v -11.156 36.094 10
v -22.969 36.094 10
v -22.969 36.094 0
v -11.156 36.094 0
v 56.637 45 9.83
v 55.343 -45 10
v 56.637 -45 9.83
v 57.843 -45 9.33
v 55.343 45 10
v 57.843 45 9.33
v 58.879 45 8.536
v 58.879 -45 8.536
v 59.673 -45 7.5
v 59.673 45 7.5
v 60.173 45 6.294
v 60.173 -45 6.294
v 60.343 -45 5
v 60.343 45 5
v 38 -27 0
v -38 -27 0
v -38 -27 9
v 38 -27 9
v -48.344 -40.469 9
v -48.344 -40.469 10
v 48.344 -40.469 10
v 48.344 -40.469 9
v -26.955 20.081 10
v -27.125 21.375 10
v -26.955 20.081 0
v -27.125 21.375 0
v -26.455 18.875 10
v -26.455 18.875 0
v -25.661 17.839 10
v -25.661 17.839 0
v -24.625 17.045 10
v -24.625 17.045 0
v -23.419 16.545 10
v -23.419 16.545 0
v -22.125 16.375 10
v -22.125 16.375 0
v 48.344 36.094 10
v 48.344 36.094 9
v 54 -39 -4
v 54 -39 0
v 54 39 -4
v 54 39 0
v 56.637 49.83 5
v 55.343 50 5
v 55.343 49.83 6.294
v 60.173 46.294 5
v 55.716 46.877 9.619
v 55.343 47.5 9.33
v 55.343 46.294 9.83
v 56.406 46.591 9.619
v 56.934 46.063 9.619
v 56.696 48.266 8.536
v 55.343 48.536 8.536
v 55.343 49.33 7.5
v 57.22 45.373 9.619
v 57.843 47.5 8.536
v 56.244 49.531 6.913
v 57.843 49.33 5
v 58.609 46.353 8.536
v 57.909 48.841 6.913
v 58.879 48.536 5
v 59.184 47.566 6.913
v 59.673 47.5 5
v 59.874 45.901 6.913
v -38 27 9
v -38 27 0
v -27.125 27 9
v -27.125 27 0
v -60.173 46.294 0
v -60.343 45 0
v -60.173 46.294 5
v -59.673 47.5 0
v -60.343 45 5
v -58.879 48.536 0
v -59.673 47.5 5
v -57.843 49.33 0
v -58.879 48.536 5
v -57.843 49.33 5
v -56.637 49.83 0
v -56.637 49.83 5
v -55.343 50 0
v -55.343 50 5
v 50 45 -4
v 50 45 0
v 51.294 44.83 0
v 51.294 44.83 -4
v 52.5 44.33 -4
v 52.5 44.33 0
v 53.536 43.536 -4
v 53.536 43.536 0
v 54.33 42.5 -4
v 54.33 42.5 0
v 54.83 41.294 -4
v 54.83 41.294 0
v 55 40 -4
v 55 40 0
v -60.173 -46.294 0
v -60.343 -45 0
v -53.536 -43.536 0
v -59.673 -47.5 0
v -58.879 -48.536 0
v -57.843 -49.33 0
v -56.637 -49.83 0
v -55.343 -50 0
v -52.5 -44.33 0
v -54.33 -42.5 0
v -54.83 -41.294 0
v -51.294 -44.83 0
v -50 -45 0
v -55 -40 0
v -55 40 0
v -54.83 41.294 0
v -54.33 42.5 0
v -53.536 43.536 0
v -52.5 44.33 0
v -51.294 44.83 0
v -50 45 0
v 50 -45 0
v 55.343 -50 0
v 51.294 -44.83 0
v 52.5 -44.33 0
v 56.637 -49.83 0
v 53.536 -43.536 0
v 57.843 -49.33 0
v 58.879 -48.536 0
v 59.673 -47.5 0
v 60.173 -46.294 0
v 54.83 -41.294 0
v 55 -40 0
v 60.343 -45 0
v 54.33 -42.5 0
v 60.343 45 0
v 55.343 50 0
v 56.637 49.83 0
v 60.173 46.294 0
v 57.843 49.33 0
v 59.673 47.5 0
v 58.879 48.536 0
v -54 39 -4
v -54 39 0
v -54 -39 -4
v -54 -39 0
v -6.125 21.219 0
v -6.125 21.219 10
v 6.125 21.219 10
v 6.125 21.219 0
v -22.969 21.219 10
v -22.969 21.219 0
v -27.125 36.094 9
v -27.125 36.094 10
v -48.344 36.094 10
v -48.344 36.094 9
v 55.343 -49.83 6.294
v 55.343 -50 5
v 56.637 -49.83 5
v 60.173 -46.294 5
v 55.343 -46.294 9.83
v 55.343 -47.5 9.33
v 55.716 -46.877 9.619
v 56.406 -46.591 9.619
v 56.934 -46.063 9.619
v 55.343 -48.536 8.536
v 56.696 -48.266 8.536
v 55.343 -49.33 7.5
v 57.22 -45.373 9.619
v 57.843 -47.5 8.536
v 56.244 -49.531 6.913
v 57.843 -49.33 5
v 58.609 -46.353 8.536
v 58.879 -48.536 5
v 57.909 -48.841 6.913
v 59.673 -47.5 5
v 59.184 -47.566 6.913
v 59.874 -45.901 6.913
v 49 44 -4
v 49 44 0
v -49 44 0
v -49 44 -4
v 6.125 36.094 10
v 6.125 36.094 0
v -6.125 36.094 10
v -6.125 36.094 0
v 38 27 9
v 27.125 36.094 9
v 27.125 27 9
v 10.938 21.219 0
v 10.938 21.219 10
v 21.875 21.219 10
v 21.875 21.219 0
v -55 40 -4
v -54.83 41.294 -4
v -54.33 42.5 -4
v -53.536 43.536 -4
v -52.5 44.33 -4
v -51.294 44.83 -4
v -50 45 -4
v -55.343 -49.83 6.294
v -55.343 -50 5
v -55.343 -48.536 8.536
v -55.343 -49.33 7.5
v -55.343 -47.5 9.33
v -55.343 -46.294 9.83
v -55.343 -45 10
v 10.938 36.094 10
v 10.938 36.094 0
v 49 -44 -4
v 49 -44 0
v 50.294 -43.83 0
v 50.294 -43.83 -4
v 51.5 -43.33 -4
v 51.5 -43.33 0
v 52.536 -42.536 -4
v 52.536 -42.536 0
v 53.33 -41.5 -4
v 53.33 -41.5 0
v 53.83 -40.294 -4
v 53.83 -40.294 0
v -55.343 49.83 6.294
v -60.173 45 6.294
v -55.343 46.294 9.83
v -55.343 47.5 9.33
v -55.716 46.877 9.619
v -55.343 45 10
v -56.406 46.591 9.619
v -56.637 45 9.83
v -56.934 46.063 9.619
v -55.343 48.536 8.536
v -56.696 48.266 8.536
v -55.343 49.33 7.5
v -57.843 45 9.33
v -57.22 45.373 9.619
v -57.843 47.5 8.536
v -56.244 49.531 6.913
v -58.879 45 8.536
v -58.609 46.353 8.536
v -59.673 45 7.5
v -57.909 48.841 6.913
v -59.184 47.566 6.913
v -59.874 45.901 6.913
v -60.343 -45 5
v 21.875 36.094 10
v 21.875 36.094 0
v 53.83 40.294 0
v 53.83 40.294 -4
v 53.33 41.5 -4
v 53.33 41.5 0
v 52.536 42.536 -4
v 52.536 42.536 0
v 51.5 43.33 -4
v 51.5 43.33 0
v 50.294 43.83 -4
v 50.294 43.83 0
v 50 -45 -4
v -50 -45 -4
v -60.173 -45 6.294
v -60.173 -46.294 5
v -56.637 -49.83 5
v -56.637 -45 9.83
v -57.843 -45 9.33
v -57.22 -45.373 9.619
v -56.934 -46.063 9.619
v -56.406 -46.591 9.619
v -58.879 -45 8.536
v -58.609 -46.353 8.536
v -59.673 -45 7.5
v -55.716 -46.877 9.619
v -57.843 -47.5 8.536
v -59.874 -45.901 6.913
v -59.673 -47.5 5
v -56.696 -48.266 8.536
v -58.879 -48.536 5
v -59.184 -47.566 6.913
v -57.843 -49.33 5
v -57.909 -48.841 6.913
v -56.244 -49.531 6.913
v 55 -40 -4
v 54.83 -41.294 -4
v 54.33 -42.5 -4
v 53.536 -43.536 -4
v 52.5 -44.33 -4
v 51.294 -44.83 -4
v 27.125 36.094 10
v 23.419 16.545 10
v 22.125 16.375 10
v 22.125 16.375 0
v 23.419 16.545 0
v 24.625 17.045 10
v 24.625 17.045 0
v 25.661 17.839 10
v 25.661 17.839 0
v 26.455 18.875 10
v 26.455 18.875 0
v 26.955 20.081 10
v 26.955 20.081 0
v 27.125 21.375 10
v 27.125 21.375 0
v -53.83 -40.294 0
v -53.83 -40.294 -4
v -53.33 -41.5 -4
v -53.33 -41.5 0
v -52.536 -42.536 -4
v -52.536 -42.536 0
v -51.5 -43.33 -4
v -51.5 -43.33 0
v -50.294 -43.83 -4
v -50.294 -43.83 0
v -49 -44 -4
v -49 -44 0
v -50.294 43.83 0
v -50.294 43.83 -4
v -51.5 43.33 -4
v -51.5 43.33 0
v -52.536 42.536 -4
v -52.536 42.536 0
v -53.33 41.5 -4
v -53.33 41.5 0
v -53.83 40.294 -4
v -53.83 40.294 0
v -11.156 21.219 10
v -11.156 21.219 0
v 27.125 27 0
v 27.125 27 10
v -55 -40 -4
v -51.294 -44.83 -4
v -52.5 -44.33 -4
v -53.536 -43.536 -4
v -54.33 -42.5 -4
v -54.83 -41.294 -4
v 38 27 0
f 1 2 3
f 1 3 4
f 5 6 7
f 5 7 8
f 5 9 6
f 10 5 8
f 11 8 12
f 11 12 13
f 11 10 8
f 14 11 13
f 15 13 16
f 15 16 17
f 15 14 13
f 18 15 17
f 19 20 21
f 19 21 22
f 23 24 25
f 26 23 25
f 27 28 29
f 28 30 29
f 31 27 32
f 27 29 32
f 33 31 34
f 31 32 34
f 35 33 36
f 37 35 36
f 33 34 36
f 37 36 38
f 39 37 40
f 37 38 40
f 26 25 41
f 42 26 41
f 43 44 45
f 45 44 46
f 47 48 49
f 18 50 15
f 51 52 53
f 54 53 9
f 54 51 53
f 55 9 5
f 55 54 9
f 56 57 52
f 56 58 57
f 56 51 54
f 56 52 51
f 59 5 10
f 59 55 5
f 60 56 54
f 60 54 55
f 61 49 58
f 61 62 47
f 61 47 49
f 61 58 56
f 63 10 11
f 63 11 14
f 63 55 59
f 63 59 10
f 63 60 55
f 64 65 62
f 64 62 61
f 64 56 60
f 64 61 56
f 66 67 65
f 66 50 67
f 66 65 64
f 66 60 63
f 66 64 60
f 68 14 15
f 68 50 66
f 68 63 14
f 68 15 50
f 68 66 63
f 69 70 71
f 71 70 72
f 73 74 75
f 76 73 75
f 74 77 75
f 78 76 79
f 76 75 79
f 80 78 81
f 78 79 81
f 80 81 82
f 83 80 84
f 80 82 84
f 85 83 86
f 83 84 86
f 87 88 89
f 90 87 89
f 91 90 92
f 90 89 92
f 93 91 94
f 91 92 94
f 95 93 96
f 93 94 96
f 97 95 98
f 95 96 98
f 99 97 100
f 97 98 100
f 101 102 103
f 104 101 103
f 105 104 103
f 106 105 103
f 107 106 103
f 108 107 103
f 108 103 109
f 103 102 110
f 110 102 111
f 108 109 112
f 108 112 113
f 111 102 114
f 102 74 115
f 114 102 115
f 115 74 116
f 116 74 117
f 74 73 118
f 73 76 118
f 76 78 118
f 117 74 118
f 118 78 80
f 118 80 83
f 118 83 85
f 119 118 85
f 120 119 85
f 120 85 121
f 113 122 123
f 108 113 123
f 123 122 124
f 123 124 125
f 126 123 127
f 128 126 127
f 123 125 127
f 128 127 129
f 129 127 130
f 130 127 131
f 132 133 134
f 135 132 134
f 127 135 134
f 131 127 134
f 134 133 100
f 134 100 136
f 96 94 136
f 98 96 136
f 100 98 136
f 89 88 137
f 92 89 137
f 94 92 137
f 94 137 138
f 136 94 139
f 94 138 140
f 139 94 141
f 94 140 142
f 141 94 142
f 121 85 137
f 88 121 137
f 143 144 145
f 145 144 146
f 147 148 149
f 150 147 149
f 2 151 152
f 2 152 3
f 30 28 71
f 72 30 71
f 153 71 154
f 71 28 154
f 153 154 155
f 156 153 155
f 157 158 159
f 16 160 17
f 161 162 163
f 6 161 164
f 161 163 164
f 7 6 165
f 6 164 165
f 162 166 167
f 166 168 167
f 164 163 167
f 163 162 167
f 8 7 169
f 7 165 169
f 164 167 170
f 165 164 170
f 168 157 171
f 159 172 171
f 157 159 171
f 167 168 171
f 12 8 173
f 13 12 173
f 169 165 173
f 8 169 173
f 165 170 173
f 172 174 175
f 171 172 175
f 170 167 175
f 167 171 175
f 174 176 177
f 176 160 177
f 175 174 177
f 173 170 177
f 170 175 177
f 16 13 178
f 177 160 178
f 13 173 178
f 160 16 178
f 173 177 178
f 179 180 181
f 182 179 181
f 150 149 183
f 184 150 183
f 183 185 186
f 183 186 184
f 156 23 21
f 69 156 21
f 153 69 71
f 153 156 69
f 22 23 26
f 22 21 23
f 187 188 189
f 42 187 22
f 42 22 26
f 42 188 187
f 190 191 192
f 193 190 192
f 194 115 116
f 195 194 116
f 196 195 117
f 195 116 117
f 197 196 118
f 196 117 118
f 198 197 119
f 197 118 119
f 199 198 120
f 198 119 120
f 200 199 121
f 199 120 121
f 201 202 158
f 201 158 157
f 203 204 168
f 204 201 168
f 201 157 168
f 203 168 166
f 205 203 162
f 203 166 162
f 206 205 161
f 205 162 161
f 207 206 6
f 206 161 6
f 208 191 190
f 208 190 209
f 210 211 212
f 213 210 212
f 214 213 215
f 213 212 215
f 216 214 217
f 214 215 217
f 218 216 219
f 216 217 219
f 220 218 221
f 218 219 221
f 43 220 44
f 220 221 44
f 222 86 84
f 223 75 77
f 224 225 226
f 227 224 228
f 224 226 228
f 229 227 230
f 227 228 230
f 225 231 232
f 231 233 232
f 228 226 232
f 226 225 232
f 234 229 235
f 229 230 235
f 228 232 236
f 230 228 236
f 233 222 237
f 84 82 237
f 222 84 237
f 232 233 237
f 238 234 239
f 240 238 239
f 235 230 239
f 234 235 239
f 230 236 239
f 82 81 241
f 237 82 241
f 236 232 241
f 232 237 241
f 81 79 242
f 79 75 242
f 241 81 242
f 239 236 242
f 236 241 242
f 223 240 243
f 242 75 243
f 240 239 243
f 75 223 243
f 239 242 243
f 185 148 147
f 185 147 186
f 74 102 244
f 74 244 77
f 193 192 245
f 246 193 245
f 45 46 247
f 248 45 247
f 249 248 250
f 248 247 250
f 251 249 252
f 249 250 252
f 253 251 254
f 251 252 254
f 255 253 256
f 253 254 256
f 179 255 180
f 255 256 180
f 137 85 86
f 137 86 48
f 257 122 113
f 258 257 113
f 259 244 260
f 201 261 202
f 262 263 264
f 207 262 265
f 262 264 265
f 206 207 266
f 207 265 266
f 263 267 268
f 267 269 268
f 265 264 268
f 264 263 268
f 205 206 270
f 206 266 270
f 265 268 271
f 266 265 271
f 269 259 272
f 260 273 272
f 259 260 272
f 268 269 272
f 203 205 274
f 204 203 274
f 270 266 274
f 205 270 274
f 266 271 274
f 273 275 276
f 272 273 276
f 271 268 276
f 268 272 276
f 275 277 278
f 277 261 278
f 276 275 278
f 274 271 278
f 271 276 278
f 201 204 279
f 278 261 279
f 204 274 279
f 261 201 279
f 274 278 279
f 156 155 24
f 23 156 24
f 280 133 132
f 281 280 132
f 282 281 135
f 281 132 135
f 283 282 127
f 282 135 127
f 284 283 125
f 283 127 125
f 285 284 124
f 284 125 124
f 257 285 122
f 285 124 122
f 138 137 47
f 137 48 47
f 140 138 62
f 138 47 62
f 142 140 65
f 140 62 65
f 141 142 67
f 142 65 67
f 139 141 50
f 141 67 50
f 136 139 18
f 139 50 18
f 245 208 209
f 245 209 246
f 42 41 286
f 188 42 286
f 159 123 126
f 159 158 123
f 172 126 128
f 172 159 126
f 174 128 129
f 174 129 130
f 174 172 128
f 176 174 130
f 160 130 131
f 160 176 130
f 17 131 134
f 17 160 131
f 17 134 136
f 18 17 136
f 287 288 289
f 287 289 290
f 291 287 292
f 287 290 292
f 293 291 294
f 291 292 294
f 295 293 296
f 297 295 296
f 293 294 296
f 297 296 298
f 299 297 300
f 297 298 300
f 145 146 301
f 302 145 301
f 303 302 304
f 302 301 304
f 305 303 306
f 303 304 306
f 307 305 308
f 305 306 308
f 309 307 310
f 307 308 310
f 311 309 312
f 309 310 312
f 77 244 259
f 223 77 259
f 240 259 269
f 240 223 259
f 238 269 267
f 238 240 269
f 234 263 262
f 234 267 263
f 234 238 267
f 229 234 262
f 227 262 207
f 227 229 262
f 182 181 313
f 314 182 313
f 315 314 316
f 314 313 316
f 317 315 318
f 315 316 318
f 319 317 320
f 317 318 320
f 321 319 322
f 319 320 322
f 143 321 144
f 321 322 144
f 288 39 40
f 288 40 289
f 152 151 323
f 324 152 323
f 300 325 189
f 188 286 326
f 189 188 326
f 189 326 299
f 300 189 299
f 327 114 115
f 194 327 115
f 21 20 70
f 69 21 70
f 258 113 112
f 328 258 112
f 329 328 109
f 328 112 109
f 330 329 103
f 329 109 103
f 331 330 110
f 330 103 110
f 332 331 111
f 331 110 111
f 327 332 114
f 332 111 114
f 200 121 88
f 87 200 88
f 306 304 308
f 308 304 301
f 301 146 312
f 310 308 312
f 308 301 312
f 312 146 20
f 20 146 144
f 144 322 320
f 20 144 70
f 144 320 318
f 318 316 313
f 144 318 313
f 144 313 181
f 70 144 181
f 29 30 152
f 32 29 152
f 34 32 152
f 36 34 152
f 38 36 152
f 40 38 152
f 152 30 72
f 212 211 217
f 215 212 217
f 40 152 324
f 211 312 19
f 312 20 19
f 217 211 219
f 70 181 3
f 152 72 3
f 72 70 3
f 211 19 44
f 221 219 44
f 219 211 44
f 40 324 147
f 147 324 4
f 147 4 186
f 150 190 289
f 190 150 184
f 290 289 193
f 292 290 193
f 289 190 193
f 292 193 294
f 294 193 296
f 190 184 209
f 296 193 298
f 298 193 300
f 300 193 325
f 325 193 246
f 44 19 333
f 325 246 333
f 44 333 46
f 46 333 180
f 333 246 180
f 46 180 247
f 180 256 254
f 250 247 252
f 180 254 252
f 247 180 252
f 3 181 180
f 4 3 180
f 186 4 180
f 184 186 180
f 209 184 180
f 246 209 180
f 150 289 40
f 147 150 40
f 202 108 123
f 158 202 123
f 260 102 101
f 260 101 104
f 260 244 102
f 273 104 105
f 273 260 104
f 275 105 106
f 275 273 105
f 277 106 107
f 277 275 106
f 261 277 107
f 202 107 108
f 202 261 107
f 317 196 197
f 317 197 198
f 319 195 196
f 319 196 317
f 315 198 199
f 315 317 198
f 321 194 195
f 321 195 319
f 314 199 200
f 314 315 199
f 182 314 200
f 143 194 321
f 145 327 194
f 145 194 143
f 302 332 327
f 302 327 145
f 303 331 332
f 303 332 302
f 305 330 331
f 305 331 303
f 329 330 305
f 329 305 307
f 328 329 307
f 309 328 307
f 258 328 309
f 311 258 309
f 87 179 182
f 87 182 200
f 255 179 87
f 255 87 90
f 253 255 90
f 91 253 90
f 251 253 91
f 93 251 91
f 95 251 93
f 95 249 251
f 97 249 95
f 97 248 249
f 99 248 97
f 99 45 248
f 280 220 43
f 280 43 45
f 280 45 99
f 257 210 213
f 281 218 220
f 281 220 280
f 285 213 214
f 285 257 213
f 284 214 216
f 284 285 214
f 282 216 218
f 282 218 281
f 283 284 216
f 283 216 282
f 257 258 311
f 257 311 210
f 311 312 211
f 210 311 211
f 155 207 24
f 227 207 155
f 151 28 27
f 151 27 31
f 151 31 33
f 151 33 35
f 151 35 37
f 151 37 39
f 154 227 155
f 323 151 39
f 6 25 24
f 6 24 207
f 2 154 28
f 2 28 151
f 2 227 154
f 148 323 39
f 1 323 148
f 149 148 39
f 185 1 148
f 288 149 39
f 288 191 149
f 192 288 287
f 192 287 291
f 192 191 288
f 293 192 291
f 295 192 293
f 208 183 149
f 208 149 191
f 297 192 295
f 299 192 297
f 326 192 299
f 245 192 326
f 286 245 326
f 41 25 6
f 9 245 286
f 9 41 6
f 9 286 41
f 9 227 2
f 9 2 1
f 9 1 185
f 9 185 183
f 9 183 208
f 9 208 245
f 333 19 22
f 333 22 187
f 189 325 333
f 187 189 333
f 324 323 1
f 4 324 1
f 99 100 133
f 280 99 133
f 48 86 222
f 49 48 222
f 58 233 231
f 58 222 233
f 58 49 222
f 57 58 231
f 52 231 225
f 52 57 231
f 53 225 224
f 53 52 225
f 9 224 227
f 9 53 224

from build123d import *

# Parameters (mm, degrees)
F0_W      = 120.686
F0_H      = 100
F0_W_2    = 76
F0_H_2    = 54
F1_DEPTH  = 10
F3_DEPTH  = 4
F4_R      = 5
F5_W      = 54.2500019073
F5_H      = 10.6249998808
F6_DEPTH  = 10
F8_DEPTH  = 1
F9_W      = 11.812498793
F9_H      = 14.8750022054
F9_W_2    = 12.2500015423
F9_W_3    = 10.9374932945
F10_DEPTH = 25
F11_R     = 5


# Not quite as in the source:
# - a feature names something its author has since deleted; it is built from what else it names


with BuildPart() as f1:
    # F0 (on Top) → F1 (new body)
    with BuildSketch(Plane.XY):
        Rectangle(F0_W, F0_H)
        Rectangle(F0_W_2, F0_H_2, mode=Mode.SUBTRACT)
    extrude(amount=F1_DEPTH)

    # F2 (on face) → F3 (join)
    with BuildSketch(Plane(origin=(0, 0, 0), x_dir=(1, 0, 0), z_dir=(0, 0, -1))):
        with BuildLine():
            ThreePointArc((55, 40), (53.5355339059, 43.5355339059), (50, 45))
            Line((50, 45), (-50, 45))
            ThreePointArc((-50, 45), (-53.5355339059, 43.5355339059), (-55, 40))
            Line((-55, 40), (-55, -40))
            ThreePointArc((-55, -40), (-53.5355339059, -43.5355339059), (-50, -45))
            Line((-50, -45), (50, -45))
            ThreePointArc((50, -45), (53.5355339059, -43.5355339059), (55, -40))
            Line((55, -40), (55, 40))
        make_face()
        with BuildLine():
            Line((-49, 44), (49, 44))
            ThreePointArc((49, 44), (52.5355339059, 42.5355339059), (54, 39))
            Line((54, 39), (54, -39))
            ThreePointArc((54, -39), (52.5355339059, -42.5355339059), (49, -44))
            Line((49, -44), (-49, -44))
            ThreePointArc((-49, -44), (-52.5355339059, -42.5355339059), (-54, -39))
            Line((-54, -39), (-54, 39))
            ThreePointArc((-54, 39), (-52.5355339059, 42.5355339059), (-49, 44))
        make_face(mode=Mode.SUBTRACT)
    extrude(amount=F3_DEPTH)

    # F4
    f4_edges = [f1.edges().sort_by_distance(p)[0] for p in [
        (-60.343, -50, 5),
        (60.343, -50, 5),
        (60.343, 50, 5),
        (-60.343, 50, 5),
        (0, 50, 10),
        (-60.343, 0, 10),
        (0, -50, 10),
        (60.343, 0, 10),
    ]]
    fillet(f4_edges, radius=F4_R)

    # F5 (on face) → F6 (join)
    with BuildSketch(Plane.XY.offset(10)):
        with Locations((0, 21.6875000596)):
            Rectangle(F5_W, F5_H)
    extrude(amount=-F6_DEPTH)

    # F7 (on face) → F8 (cut)
    with BuildSketch(Plane.XY.offset(10)):
        Polygon((48.3437515795, -40.4687528498), (48.3437515795, 36.0937528312), (27.1250009537, 36.0937528312), (27.1250009537, 27), (38, 27), (38, -27), (-38, -27), (-38, 27), (-27.1250009537, 27), (-27.1250009537, 36.0937528312), (-48.3437515795, 36.0937528312), (-48.3437515795, -40.4687528498), align=None)
    extrude(amount=-F8_DEPTH, mode=Mode.SUBTRACT)

    # F9 (on face) → F10 (cut)
    with BuildSketch(Plane.XY.offset(10)):
        with Locations((-17.0625001192, 28.6562517285)):
            Rectangle(F9_W, F9_H)
        with Locations((0, 28.6562517285)):
            Rectangle(F9_W_2, F9_H)
        with Locations((16.4062529802, 28.6562517285)):
            Rectangle(F9_W_3, F9_H)
    extrude(amount=-F10_DEPTH, mode=Mode.SUBTRACT)

    # F11
    f11_edges = [f1.edges().sort_by_distance(p)[0] for p in [
        (-27.125001, 16.375, 5),
        (27.125001, 16.375, 5),
    ]]
    fillet(f11_edges, radius=F11_R)


solid = f1.part
